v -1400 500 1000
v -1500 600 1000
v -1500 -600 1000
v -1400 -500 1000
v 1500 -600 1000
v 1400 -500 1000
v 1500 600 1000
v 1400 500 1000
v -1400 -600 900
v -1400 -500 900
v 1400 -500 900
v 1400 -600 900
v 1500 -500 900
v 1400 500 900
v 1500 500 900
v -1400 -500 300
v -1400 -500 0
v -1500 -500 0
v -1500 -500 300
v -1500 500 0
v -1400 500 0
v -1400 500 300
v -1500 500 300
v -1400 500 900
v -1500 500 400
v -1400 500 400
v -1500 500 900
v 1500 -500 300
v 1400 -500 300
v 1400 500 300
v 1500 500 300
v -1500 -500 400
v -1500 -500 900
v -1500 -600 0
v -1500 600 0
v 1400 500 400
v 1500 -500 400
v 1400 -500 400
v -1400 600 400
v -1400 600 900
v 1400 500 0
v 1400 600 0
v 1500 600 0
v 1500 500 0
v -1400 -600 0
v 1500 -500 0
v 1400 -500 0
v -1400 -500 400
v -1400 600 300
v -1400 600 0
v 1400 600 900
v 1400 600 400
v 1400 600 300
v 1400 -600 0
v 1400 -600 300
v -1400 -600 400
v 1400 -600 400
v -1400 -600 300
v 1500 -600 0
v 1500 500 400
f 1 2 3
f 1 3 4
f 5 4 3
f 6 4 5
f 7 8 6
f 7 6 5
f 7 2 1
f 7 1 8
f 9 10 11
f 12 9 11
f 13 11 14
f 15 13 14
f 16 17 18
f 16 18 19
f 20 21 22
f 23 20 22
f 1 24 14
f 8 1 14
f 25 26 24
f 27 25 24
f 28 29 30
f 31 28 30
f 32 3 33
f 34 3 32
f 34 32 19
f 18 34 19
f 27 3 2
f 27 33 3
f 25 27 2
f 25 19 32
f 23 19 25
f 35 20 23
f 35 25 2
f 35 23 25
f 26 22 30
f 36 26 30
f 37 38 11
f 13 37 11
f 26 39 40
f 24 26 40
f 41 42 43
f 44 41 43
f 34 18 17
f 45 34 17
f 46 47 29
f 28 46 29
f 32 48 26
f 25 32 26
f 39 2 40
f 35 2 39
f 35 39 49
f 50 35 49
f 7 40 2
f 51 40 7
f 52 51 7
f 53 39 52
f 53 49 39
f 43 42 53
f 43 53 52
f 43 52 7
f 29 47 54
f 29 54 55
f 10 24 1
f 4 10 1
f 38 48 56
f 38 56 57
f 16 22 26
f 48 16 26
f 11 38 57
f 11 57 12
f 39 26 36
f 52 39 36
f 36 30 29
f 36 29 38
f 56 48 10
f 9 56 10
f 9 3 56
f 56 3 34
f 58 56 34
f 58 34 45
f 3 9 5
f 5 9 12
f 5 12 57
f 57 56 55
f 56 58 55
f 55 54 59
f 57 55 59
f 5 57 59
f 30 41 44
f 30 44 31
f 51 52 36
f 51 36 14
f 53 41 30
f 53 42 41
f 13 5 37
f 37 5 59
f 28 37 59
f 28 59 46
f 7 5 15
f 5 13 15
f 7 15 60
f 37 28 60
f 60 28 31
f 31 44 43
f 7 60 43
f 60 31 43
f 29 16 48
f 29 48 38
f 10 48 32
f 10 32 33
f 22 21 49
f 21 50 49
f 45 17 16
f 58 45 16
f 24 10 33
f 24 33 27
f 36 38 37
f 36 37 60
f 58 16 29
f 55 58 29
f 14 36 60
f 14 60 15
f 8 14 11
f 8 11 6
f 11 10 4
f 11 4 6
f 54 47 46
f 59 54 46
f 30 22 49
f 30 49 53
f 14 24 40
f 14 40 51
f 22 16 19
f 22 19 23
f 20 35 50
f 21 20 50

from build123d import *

# Parameters (mm, degrees)
F0_W          = 3000
F0_H          = 1200
F0_W_2        = 2800
F0_H_2        = 1000
F1_DEPTH      = 1000
F2_W          = 2800
F2_H          = 500
F2_H_2        = 300
F3_DEPTH      = 600.001
F3_DEPTH_BACK = 600.001
F4_W          = 1000
F4_H          = 500
F4_H_2        = 300
F5_DEPTH      = 1500.001
F5_DEPTH_BACK = 1500.001


with BuildPart() as f1:
    # F0 (on Top) → F1 (new body)
    with BuildSketch(Plane.XY):
        Rectangle(F0_W, F0_H)
        Rectangle(F0_W_2, F0_H_2, mode=Mode.SUBTRACT)
    extrude(amount=F1_DEPTH)

    # F2 (on Front) → F3 (cut, two sides)
    with BuildSketch(Plane.XZ) as f3_sk:
        with Locations((0, 650)):
            Rectangle(F2_W, F2_H)
        with Locations((0, 150)):
            Rectangle(F2_W, F2_H_2)
    extrude(amount=-F3_DEPTH, mode=Mode.SUBTRACT)
    extrude(f3_sk.sketch, amount=F3_DEPTH_BACK, mode=Mode.SUBTRACT)

    # F4 (on Right) → F5 (cut, two sides)
    with BuildSketch(Plane.YZ) as f5_sk:
        with Locations((0, 650)):
            Rectangle(F4_W, F4_H)
        with Locations((0, 150)):
            Rectangle(F4_W, F4_H_2)
    extrude(amount=-F5_DEPTH, mode=Mode.SUBTRACT)
    extrude(f5_sk.sketch, amount=F5_DEPTH_BACK, mode=Mode.SUBTRACT)


solid = f1.part
